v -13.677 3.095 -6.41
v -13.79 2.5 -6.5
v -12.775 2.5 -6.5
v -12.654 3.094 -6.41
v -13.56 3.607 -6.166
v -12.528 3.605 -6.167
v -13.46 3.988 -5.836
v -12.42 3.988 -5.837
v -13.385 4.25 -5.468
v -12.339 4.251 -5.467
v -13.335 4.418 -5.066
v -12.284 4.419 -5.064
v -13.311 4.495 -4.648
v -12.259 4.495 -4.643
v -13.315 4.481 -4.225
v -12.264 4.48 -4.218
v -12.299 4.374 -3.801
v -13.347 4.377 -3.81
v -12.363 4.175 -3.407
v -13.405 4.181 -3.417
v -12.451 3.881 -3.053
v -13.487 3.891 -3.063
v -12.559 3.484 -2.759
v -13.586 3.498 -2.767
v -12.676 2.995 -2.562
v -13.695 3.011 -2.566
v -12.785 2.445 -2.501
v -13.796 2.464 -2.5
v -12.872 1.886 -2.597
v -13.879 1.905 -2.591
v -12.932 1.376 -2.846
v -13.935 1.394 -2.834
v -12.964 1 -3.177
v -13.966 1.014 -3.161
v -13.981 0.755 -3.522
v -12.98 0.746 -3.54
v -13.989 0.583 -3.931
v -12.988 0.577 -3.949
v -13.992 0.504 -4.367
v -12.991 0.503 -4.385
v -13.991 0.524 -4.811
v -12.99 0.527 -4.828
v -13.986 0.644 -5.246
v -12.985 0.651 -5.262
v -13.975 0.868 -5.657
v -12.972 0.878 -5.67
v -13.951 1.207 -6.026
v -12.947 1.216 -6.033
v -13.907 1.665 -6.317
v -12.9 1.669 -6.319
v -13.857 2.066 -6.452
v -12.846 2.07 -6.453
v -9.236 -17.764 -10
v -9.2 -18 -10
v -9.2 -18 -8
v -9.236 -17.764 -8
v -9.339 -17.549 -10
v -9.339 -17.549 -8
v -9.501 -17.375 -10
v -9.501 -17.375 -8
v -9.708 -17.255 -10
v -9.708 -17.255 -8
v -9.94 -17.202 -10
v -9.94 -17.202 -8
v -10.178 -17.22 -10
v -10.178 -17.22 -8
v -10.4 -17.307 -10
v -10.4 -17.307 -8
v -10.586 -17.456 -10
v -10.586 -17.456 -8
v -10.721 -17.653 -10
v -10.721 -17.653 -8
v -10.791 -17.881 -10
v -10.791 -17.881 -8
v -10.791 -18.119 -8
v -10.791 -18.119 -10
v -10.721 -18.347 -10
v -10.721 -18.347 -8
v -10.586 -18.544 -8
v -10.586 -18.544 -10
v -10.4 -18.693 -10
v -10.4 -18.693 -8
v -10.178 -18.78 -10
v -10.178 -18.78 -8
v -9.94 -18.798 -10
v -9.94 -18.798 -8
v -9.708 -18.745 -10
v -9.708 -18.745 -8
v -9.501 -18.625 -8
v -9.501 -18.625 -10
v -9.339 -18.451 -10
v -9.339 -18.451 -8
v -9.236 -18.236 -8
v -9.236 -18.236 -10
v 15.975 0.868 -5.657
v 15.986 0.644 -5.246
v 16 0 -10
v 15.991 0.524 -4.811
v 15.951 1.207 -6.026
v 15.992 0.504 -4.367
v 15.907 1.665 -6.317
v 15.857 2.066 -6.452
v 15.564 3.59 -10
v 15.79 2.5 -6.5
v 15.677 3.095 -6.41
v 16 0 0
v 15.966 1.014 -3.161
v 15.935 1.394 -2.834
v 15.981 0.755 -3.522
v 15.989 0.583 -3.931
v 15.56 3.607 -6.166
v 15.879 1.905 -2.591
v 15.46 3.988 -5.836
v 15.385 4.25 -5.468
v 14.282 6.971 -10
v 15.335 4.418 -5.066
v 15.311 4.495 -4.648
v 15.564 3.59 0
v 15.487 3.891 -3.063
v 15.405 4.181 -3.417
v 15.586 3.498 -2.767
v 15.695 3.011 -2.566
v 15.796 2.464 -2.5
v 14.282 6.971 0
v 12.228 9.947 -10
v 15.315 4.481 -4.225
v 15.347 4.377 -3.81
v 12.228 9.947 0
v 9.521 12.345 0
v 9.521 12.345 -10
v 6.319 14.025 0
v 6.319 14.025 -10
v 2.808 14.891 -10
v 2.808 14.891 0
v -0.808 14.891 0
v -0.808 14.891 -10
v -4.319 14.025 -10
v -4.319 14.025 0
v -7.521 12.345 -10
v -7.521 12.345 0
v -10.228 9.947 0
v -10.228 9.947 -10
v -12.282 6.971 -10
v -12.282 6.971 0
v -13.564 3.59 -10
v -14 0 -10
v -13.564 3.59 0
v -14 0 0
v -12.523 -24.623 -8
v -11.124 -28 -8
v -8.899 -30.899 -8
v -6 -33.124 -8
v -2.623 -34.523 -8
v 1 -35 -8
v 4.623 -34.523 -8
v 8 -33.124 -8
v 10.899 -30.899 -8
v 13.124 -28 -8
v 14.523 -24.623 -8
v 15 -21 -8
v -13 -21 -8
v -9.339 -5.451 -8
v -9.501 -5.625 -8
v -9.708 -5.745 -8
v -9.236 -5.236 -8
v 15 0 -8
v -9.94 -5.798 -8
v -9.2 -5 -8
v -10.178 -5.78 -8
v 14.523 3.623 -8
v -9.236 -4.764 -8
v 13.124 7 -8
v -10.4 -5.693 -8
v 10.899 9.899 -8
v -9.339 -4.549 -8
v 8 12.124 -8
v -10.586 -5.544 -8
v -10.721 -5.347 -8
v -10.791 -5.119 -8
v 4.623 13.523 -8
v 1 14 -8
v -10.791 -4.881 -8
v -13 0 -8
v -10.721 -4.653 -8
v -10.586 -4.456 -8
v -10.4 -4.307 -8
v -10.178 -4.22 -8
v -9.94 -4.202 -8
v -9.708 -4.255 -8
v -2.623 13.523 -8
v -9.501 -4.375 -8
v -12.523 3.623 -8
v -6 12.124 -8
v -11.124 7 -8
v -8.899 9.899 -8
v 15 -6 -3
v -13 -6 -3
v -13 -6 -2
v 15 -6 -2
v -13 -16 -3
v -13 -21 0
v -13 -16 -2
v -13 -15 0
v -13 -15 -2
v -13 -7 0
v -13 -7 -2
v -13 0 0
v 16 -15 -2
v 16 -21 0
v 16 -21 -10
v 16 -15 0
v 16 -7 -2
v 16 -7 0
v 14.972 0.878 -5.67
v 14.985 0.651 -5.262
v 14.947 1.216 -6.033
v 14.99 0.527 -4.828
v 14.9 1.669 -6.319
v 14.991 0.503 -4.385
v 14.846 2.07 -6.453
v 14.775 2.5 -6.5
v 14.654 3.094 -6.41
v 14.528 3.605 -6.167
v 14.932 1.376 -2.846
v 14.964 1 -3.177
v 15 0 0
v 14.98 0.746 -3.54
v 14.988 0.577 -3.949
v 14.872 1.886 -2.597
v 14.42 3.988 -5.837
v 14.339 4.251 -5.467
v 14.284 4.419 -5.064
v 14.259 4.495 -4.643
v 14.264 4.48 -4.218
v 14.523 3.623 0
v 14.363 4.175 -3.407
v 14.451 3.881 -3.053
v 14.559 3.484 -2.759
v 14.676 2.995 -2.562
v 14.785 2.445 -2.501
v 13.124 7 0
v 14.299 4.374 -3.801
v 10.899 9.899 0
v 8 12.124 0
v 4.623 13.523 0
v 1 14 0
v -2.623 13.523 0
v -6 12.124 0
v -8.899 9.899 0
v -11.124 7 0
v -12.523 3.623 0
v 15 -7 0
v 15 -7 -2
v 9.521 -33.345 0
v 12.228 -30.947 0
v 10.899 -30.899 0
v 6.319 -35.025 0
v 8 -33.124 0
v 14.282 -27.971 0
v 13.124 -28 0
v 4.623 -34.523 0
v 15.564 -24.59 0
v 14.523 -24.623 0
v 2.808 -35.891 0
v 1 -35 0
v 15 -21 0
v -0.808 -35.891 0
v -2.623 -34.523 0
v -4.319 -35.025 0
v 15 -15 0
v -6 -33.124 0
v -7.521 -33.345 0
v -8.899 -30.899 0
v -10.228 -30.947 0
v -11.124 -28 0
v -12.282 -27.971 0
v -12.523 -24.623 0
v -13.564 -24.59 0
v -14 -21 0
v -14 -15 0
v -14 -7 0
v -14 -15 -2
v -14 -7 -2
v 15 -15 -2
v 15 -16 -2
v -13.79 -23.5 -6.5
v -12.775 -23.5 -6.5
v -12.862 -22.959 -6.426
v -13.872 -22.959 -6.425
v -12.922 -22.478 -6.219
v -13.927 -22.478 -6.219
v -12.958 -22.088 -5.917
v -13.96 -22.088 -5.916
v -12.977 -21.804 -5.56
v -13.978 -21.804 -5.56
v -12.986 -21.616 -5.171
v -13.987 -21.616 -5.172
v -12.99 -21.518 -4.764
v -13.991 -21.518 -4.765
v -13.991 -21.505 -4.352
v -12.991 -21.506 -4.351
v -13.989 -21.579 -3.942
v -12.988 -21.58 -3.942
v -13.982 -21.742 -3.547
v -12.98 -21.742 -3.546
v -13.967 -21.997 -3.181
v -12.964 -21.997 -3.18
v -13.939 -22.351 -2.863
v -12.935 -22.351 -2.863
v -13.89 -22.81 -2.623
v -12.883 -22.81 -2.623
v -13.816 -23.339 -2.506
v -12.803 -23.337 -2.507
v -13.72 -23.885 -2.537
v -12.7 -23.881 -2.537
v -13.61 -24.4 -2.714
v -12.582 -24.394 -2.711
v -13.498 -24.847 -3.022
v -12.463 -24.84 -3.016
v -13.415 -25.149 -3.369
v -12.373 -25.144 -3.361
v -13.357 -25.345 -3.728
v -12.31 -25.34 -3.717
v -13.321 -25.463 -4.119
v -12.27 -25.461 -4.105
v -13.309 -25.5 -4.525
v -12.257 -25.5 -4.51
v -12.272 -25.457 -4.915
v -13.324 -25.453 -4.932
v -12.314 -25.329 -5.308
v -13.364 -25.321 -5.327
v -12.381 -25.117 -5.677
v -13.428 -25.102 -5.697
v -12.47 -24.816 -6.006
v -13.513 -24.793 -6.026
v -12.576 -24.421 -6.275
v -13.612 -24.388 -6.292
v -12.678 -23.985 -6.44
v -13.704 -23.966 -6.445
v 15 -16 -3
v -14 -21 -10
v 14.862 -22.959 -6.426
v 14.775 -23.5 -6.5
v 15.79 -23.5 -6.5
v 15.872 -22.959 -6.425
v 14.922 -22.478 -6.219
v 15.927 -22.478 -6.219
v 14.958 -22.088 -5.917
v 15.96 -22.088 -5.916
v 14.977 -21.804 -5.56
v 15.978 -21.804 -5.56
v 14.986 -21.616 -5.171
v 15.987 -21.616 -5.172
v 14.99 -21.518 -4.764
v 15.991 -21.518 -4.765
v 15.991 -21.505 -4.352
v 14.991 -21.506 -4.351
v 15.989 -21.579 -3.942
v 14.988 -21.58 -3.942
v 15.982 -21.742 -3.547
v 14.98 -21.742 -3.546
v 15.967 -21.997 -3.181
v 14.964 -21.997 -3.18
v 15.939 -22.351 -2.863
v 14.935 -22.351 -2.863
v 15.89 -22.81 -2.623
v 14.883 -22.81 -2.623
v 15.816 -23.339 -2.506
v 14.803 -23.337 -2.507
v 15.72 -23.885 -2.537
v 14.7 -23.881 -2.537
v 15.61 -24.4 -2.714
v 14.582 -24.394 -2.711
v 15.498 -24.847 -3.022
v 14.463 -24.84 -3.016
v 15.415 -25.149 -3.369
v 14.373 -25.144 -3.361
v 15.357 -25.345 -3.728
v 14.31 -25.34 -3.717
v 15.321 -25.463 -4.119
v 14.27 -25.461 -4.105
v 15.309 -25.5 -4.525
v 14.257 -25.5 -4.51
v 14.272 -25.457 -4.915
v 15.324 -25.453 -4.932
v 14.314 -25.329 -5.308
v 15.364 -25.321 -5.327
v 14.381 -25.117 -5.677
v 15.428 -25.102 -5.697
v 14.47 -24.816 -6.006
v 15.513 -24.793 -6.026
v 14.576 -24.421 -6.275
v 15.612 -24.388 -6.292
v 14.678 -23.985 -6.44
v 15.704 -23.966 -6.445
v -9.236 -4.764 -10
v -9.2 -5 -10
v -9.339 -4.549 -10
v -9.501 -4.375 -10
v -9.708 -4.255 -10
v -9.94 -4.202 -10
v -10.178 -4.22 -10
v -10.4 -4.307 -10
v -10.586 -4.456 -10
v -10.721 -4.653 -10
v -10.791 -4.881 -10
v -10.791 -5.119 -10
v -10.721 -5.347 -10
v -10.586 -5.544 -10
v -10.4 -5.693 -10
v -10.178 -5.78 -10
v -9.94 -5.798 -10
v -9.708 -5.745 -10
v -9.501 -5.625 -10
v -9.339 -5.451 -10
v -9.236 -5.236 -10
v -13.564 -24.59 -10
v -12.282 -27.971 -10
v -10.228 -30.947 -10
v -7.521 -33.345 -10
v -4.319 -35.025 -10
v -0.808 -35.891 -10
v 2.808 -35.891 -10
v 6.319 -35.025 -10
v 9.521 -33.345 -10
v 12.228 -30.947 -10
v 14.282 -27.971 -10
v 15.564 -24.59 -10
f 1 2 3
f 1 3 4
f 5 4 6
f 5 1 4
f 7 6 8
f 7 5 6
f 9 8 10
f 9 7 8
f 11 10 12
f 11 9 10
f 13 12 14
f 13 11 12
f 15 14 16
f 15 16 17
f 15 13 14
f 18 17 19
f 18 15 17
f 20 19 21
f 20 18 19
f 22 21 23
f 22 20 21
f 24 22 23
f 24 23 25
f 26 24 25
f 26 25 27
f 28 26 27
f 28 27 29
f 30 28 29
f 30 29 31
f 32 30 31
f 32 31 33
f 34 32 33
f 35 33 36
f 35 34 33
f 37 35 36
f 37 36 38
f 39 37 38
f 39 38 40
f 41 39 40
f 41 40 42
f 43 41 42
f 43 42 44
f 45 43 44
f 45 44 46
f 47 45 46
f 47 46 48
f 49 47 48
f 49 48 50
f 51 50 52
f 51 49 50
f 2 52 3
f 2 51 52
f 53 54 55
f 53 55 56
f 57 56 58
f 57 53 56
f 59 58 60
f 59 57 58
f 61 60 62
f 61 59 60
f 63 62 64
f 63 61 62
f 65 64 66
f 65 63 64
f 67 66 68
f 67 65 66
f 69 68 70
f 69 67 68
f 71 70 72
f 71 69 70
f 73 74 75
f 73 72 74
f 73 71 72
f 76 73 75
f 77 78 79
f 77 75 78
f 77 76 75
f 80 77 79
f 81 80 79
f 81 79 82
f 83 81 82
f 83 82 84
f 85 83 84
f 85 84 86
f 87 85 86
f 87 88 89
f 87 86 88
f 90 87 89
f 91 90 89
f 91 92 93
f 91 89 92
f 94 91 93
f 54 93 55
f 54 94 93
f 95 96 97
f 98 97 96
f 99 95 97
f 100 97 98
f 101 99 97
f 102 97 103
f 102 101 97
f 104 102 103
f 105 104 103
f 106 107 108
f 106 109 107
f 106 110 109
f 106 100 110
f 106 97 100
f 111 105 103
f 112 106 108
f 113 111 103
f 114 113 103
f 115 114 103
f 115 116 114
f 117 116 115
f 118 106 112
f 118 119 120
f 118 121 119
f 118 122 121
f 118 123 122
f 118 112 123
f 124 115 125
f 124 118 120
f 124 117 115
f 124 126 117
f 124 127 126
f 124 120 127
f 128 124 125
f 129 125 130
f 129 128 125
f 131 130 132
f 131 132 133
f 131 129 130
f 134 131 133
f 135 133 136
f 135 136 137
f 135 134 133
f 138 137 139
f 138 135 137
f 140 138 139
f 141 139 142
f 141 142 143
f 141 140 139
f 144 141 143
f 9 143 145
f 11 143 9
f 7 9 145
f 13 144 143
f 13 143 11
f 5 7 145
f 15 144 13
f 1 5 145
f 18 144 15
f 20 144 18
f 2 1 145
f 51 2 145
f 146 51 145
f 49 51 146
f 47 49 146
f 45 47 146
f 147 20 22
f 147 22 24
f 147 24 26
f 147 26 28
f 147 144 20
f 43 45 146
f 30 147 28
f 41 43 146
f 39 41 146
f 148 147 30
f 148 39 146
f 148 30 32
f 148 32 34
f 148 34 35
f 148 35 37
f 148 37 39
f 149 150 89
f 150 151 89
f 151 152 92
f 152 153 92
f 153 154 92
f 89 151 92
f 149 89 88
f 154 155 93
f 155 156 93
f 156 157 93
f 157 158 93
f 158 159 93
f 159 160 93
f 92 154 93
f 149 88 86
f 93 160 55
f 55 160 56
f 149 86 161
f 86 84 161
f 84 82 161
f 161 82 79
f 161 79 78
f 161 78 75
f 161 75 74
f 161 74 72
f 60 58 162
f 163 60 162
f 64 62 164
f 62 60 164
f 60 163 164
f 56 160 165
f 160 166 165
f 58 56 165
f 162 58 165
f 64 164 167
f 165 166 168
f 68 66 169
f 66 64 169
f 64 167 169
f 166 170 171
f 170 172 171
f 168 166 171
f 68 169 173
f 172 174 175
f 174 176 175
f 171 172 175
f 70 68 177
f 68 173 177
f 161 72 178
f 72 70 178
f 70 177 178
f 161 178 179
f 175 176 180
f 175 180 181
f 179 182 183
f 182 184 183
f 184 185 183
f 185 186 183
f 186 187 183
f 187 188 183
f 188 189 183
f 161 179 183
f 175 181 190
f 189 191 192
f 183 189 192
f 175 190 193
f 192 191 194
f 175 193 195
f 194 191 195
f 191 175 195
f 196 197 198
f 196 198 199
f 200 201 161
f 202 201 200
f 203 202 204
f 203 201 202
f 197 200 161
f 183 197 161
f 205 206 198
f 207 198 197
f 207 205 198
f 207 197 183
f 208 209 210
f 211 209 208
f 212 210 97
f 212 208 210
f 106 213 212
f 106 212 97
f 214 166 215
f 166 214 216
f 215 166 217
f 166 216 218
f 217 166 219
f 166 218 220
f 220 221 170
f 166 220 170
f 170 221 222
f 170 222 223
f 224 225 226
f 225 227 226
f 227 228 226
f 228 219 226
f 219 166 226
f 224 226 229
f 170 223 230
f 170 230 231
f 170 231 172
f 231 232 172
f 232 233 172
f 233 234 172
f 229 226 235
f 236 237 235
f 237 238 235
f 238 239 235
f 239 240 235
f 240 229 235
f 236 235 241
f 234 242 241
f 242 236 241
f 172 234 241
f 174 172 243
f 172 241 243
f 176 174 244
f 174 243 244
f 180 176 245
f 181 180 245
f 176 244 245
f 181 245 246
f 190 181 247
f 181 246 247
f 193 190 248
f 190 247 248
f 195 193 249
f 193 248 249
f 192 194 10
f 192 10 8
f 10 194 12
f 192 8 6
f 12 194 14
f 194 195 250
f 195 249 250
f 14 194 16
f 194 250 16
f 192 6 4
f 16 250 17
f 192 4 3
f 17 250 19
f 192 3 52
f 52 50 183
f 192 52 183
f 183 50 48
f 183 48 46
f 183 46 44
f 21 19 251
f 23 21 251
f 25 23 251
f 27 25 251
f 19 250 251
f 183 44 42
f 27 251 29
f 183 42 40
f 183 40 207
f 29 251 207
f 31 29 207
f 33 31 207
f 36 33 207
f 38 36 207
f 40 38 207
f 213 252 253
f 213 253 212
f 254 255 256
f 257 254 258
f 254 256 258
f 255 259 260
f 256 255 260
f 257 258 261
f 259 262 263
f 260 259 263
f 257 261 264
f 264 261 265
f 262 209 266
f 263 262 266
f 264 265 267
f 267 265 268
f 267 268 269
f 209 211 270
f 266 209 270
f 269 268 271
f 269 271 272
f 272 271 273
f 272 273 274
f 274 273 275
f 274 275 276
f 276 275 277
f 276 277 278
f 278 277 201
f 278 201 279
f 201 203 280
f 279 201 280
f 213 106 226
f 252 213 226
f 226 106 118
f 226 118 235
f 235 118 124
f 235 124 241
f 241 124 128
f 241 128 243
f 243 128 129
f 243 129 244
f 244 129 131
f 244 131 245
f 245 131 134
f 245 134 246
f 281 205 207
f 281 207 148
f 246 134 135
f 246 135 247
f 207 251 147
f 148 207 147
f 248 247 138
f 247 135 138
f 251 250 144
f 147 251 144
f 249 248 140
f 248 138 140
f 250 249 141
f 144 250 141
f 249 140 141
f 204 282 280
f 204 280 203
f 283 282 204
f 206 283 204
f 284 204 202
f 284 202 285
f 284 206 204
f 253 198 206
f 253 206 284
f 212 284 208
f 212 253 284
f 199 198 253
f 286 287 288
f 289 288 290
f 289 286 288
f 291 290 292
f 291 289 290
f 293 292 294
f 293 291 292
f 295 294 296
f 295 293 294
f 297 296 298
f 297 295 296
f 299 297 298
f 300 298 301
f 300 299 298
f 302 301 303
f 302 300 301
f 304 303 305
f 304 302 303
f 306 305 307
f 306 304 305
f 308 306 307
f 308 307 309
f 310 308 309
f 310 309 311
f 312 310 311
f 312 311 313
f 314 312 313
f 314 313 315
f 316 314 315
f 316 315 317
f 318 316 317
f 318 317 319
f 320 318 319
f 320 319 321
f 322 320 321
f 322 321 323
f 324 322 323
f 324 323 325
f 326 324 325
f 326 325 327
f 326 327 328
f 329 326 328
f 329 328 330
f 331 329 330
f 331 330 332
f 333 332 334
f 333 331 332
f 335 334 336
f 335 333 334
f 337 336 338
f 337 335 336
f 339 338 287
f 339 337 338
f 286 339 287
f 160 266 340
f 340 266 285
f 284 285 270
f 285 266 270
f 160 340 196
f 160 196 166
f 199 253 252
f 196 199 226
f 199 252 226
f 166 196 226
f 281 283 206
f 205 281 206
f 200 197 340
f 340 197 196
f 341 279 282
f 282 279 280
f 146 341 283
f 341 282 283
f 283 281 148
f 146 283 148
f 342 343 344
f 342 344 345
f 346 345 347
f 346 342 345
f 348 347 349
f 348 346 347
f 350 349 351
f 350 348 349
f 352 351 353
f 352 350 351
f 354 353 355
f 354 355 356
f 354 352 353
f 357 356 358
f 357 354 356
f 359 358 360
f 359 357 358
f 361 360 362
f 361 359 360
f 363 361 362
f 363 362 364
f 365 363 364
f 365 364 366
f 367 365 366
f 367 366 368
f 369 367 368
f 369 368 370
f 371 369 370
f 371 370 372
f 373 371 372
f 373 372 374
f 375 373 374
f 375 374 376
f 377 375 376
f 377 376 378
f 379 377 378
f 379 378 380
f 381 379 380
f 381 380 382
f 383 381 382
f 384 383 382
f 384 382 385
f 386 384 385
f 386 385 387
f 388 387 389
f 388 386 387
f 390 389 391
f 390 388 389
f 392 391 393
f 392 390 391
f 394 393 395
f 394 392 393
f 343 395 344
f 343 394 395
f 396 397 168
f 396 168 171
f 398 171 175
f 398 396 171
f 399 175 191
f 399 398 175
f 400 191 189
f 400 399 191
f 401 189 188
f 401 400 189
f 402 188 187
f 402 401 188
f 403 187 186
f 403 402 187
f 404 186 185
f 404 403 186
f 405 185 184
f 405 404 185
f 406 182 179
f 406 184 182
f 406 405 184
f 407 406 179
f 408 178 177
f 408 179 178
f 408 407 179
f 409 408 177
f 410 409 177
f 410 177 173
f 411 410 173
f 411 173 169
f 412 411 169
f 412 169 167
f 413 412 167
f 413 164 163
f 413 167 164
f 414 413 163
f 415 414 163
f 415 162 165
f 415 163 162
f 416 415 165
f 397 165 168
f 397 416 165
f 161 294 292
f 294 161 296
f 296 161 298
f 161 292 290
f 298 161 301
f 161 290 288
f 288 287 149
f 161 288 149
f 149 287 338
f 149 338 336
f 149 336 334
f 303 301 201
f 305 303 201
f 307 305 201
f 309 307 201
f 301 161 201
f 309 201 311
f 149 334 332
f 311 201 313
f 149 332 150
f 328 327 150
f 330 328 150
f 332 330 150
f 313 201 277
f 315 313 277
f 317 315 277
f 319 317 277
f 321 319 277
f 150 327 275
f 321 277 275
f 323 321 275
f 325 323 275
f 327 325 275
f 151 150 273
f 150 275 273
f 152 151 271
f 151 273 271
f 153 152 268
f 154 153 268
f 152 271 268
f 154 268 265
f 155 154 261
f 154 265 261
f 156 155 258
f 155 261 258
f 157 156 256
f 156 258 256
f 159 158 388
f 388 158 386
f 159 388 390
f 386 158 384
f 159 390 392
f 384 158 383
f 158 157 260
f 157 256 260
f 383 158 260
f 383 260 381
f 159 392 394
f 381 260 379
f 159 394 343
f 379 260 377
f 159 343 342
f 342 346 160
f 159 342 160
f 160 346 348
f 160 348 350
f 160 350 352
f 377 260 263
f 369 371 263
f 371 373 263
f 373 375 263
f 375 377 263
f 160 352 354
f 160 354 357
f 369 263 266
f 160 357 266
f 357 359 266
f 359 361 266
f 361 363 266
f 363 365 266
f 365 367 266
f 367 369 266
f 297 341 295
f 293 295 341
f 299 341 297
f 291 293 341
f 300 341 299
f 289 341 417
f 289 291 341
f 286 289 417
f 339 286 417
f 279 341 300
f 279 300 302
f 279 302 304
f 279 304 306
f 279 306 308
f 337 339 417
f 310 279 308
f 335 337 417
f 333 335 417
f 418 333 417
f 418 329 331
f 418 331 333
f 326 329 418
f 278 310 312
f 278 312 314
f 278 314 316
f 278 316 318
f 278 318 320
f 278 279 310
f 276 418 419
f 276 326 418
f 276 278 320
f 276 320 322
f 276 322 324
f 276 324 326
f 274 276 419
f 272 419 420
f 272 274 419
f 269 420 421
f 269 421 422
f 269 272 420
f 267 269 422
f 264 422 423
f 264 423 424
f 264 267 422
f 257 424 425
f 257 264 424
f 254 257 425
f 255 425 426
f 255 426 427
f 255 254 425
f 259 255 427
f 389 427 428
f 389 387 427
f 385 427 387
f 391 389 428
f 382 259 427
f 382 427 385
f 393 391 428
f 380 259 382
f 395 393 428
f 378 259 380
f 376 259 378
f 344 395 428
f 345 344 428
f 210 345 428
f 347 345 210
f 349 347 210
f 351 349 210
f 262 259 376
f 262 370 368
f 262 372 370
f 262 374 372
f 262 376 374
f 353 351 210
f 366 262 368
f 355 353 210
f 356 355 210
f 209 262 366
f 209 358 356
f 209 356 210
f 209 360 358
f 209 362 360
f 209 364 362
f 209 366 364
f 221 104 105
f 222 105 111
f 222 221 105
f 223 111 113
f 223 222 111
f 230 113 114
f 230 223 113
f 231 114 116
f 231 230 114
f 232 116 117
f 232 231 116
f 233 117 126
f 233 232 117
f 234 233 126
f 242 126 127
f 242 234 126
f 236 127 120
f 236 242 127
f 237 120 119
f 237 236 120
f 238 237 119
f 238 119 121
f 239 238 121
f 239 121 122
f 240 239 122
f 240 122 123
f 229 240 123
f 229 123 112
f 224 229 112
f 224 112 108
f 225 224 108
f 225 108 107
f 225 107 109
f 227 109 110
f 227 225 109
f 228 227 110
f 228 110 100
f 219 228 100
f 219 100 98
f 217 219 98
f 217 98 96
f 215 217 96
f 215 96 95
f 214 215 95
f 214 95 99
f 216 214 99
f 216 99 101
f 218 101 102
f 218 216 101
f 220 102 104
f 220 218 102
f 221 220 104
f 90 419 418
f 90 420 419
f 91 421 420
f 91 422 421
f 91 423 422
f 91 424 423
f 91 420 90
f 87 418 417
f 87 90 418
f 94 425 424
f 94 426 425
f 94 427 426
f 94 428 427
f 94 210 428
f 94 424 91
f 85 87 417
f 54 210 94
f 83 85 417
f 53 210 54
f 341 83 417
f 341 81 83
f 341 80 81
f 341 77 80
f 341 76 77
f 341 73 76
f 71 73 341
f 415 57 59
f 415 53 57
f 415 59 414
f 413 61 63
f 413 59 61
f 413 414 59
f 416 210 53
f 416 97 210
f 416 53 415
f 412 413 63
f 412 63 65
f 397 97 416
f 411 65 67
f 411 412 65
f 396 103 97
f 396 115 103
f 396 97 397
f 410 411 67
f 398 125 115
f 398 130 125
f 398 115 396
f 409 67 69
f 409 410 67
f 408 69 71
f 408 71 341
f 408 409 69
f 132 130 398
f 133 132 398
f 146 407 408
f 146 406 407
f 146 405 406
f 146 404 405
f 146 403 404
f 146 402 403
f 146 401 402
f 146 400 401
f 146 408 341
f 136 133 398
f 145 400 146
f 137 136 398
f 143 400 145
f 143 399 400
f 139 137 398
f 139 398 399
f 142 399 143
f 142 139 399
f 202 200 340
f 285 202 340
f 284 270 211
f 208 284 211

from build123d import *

# Parameters (mm, degrees)
CYLINDER049_R           = 0.8
CYLINDER049_DEPTH       = 10
CYLINDER048_R           = 0.8
CYLINDER048_DEPTH       = 10
BOX013_W                = 28
BOX013_H                = 10
BOX013_DEPTH            = 2
BOX011_W                = 28
BOX011_H                = 10
BOX011_DEPTH            = 3
CYLINDER029_R           = 2
CYLINDER029_DEPTH       = 10
CYLINDER029_PITCH_ANGLE = 90
CYLINDER031_R           = 2
CYLINDER031_DEPTH       = 10
CYLINDER031_PITCH_ANGLE = 90
CYLINDER030_R           = 2
CYLINDER030_DEPTH       = 10
CYLINDER030_PITCH_ANGLE = 90
CYLINDER028_R           = 2
CYLINDER028_DEPTH       = 10
CYLINDER028_PITCH_ANGLE = 90
BOX012_W                = 33
BOX012_H                = 8
BOX012_DEPTH            = 2
CYLINDER002_W           = 14
CYLINDER002_H           = 8
CYLINDER002_ANGLE       = 180
CYLINDER001_W           = 15
CYLINDER001_H           = 10
CYLINDER001_ANGLE       = 180
CYLINDER003_W           = 14
CYLINDER003_H           = 8
CYLINDER003_ANGLE       = 180
CYLINDER_W              = 15
CYLINDER_H              = 10
CYLINDER_ANGLE          = 180
BOX001_W                = 28
BOX001_H                = 21
BOX001_DEPTH            = 8
BOX_W                   = 30
BOX_H                   = 21
BOX_DEPTH               = 10
FUSION_PLACEMENT_ANGLE  = 180


with BuildPart() as cilindro049:
    # Cylinder049 → Cylinder049 (new body)
    with BuildSketch(Plane(origin=(-10, -18, -15), x_dir=(1, 0, 0), z_dir=(0, 0, 1))):
        Circle(CYLINDER049_R)
    extrude(amount=CYLINDER049_DEPTH)


with BuildPart() as cilindro048:
    # Cylinder048 → Cylinder048 (new body)
    with BuildSketch(Plane(origin=(-10, -5, -15), x_dir=(1, 0, 0), z_dir=(0, 0, 1))):
        Circle(CYLINDER048_R)
    extrude(amount=CYLINDER048_DEPTH)


with BuildPart() as cubo013:
    # Box013 → Box013 (new body)
    with BuildSketch(Plane(origin=(-27, 54, 42), x_dir=(1, 0, 0), z_dir=(0, 0, 1))):
        with Locations((14, 5)):
            Rectangle(BOX013_W, BOX013_H)
    extrude(amount=BOX013_DEPTH)


with BuildPart() as cut004:
    # Box011 → Box011 (new body)
    with BuildSketch(Plane(origin=(-27, 54, 41), x_dir=(1, 0, 0), z_dir=(0, 0, 1))):
        with Locations((14, 5)):
            Rectangle(BOX011_W, BOX011_H)
    extrude(amount=BOX011_DEPTH)

    # Cut004: cut Cubo013
    add(cubo013.part, mode=Mode.SUBTRACT)


with BuildPart() as cilindro029:
    # Cylinder029 → Cylinder029 (new body)
    with BuildSketch(Plane.XY):
        Circle(CYLINDER029_R)
    extrude(amount=CYLINDER029_DEPTH)


with BuildPart() as cilindro029_1:
    # Cylinder029 pitch: moved
    add(cilindro029.part.rotate(Axis((0, 0, 0), (0, 1, 0)), CYLINDER029_PITCH_ANGLE))


with BuildPart() as cilindro029_2:
    # Cylinder029 placement: moved
    add(cilindro029_1.part.moved(Location((-29, 46.5, 39.5))))


with BuildPart() as cilindro031:
    # Cylinder031 → Cylinder031 (new body)
    with BuildSketch(Plane.XY):
        Circle(CYLINDER031_R)
    extrude(amount=CYLINDER031_DEPTH)


with BuildPart() as cilindro031_1:
    # Cylinder031 pitch: moved
    add(cilindro031.part.rotate(Axis((0, 0, 0), (0, 1, 0)), CYLINDER031_PITCH_ANGLE))


with BuildPart() as cilindro031_2:
    # Cylinder031 placement: moved
    add(cilindro031_1.part.moved(Location((-5, 72.5, 39.5))))


with BuildPart() as cilindro030:
    # Cylinder030 → Cylinder030 (new body)
    with BuildSketch(Plane.XY):
        Circle(CYLINDER030_R)
    extrude(amount=CYLINDER030_DEPTH)


with BuildPart() as cilindro030_1:
    # Cylinder030 pitch: moved
    add(cilindro030.part.rotate(Axis((0, 0, 0), (0, 1, 0)), CYLINDER030_PITCH_ANGLE))


with BuildPart() as cilindro030_2:
    # Cylinder030 placement: moved
    add(cilindro030_1.part.moved(Location((-5, 46.5, 39.5))))


with BuildPart() as cilindro028:
    # Cylinder028 → Cylinder028 (new body)
    with BuildSketch(Plane.XY):
        Circle(CYLINDER028_R)
    extrude(amount=CYLINDER028_DEPTH)


with BuildPart() as cilindro028_1:
    # Cylinder028 pitch: moved
    add(cilindro028.part.rotate(Axis((0, 0, 0), (0, 1, 0)), CYLINDER028_PITCH_ANGLE))


with BuildPart() as cilindro028_2:
    # Cylinder028 placement: moved
    add(cilindro028_1.part.moved(Location((-29, 72.5, 39.5))))


with BuildPart() as cubo012:
    # Box012 → Box012 (new body)
    with BuildSketch(Plane(origin=(-30, 55, 42), x_dir=(1, 0, 0), z_dir=(0, 0, 1))):
        with Locations((16.5, 4)):
            Rectangle(BOX012_W, BOX012_H)
    extrude(amount=BOX012_DEPTH)


with BuildPart() as cilindro002:
    # Cylinder002 → Cylinder002 (revolve)
    with BuildSketch(Plane(origin=(16, 49, -36), x_dir=(1, 0, 0), z_dir=(0, 1, 0))):
        with Locations((7, 4)):
            Rectangle(CYLINDER002_W, CYLINDER002_H)
    revolve(axis=Axis((16, 49, -36), (0, 0, -1)), revolution_arc=CYLINDER002_ANGLE)


with BuildPart() as cut001:
    # Cylinder001 → Cylinder001 (revolve)
    with BuildSketch(Plane(origin=(16, 49, -34), x_dir=(1, 0, 0), z_dir=(0, 1, 0))):
        with Locations((7.5, 5)):
            Rectangle(CYLINDER001_W, CYLINDER001_H)
    revolve(axis=Axis((16, 49, -34), (0, 0, -1)), revolution_arc=CYLINDER001_ANGLE)

    # Cut001: cut Cilindro002
    add(cilindro002.part, mode=Mode.SUBTRACT)


with BuildPart() as cut001_1:
    # Cut001 placement: moved
    add(cut001.part.moved(Location((-3, 0, 0))))


with BuildPart() as cilindro003:
    # Cylinder003 → Cylinder003 (revolve)
    with BuildSketch(Plane(origin=(13, 70, -36), x_dir=(-1, 0, 0), z_dir=(0, -1, 0))):
        with Locations((7, 4)):
            Rectangle(CYLINDER003_W, CYLINDER003_H)
    revolve(axis=Axis((13, 70, -36), (0, 0, -1)), revolution_arc=CYLINDER003_ANGLE)


with BuildPart() as cut002:
    # Cylinder → Cylinder (revolve)
    with BuildSketch(Plane(origin=(13, 70, -34), x_dir=(-1, 0, 0), z_dir=(0, -1, 0))):
        with Locations((7.5, 5)):
            Rectangle(CYLINDER_W, CYLINDER_H)
    revolve(axis=Axis((13, 70, -34), (0, 0, -1)), revolution_arc=CYLINDER_ANGLE)

    # Cut002: cut Cilindro003
    add(cilindro003.part, mode=Mode.SUBTRACT)


with BuildPart() as cubo001:
    # Box001 → Box001 (new body)
    with BuildSketch(Plane(origin=(-1, 49, -44), x_dir=(1, 0, 0), z_dir=(0, 0, 1))):
        with Locations((14, 10.5)):
            Rectangle(BOX001_W, BOX001_H)
    extrude(amount=BOX001_DEPTH)


with BuildPart() as cut068:
    # Box → Box (new body)
    with BuildSketch(Plane(origin=(-2, 49, -44), x_dir=(1, 0, 0), z_dir=(0, 0, 1))):
        with Locations((15, 10.5)):
            Rectangle(BOX_W, BOX_H)
    extrude(amount=BOX_DEPTH)

    # Cut: cut Cubo001
    add(cubo001.part, mode=Mode.SUBTRACT)

    # Fusion: union Cut001, Cut002
    add(cut001_1.part)
    add(cut002.part)


with BuildPart() as cut068_1:
    # Fusion placement: moved
    add(cut068.part.rotate(Axis((0, 0, 0), (0, 1, 0)), FUSION_PLACEMENT_ANGLE))

    # Cut003: cut Cubo012
    add(cubo012.part, mode=Mode.SUBTRACT)

    # Cut040: cut Cilindro028
    add(cilindro028_2.part, mode=Mode.SUBTRACT)

    # Cut041: cut Cilindro030
    add(cilindro030_2.part, mode=Mode.SUBTRACT)

    # Cut042: cut Cilindro031
    add(cilindro031_2.part, mode=Mode.SUBTRACT)

    # Cut043: cut Cilindro029
    add(cilindro029_2.part, mode=Mode.SUBTRACT)

    # Fusion002019: union Cut004
    add(cut004.part)


with BuildPart() as cut068_2:
    # Fusion002019 placement: moved
    add(cut068_1.part.moved(Location((14, -70, -44))))

    # Cut067: cut Cilindro048
    add(cilindro048.part, mode=Mode.SUBTRACT)

    # Cut068: cut Cilindro049
    add(cilindro049.part, mode=Mode.SUBTRACT)


solid = cut068_2.part
